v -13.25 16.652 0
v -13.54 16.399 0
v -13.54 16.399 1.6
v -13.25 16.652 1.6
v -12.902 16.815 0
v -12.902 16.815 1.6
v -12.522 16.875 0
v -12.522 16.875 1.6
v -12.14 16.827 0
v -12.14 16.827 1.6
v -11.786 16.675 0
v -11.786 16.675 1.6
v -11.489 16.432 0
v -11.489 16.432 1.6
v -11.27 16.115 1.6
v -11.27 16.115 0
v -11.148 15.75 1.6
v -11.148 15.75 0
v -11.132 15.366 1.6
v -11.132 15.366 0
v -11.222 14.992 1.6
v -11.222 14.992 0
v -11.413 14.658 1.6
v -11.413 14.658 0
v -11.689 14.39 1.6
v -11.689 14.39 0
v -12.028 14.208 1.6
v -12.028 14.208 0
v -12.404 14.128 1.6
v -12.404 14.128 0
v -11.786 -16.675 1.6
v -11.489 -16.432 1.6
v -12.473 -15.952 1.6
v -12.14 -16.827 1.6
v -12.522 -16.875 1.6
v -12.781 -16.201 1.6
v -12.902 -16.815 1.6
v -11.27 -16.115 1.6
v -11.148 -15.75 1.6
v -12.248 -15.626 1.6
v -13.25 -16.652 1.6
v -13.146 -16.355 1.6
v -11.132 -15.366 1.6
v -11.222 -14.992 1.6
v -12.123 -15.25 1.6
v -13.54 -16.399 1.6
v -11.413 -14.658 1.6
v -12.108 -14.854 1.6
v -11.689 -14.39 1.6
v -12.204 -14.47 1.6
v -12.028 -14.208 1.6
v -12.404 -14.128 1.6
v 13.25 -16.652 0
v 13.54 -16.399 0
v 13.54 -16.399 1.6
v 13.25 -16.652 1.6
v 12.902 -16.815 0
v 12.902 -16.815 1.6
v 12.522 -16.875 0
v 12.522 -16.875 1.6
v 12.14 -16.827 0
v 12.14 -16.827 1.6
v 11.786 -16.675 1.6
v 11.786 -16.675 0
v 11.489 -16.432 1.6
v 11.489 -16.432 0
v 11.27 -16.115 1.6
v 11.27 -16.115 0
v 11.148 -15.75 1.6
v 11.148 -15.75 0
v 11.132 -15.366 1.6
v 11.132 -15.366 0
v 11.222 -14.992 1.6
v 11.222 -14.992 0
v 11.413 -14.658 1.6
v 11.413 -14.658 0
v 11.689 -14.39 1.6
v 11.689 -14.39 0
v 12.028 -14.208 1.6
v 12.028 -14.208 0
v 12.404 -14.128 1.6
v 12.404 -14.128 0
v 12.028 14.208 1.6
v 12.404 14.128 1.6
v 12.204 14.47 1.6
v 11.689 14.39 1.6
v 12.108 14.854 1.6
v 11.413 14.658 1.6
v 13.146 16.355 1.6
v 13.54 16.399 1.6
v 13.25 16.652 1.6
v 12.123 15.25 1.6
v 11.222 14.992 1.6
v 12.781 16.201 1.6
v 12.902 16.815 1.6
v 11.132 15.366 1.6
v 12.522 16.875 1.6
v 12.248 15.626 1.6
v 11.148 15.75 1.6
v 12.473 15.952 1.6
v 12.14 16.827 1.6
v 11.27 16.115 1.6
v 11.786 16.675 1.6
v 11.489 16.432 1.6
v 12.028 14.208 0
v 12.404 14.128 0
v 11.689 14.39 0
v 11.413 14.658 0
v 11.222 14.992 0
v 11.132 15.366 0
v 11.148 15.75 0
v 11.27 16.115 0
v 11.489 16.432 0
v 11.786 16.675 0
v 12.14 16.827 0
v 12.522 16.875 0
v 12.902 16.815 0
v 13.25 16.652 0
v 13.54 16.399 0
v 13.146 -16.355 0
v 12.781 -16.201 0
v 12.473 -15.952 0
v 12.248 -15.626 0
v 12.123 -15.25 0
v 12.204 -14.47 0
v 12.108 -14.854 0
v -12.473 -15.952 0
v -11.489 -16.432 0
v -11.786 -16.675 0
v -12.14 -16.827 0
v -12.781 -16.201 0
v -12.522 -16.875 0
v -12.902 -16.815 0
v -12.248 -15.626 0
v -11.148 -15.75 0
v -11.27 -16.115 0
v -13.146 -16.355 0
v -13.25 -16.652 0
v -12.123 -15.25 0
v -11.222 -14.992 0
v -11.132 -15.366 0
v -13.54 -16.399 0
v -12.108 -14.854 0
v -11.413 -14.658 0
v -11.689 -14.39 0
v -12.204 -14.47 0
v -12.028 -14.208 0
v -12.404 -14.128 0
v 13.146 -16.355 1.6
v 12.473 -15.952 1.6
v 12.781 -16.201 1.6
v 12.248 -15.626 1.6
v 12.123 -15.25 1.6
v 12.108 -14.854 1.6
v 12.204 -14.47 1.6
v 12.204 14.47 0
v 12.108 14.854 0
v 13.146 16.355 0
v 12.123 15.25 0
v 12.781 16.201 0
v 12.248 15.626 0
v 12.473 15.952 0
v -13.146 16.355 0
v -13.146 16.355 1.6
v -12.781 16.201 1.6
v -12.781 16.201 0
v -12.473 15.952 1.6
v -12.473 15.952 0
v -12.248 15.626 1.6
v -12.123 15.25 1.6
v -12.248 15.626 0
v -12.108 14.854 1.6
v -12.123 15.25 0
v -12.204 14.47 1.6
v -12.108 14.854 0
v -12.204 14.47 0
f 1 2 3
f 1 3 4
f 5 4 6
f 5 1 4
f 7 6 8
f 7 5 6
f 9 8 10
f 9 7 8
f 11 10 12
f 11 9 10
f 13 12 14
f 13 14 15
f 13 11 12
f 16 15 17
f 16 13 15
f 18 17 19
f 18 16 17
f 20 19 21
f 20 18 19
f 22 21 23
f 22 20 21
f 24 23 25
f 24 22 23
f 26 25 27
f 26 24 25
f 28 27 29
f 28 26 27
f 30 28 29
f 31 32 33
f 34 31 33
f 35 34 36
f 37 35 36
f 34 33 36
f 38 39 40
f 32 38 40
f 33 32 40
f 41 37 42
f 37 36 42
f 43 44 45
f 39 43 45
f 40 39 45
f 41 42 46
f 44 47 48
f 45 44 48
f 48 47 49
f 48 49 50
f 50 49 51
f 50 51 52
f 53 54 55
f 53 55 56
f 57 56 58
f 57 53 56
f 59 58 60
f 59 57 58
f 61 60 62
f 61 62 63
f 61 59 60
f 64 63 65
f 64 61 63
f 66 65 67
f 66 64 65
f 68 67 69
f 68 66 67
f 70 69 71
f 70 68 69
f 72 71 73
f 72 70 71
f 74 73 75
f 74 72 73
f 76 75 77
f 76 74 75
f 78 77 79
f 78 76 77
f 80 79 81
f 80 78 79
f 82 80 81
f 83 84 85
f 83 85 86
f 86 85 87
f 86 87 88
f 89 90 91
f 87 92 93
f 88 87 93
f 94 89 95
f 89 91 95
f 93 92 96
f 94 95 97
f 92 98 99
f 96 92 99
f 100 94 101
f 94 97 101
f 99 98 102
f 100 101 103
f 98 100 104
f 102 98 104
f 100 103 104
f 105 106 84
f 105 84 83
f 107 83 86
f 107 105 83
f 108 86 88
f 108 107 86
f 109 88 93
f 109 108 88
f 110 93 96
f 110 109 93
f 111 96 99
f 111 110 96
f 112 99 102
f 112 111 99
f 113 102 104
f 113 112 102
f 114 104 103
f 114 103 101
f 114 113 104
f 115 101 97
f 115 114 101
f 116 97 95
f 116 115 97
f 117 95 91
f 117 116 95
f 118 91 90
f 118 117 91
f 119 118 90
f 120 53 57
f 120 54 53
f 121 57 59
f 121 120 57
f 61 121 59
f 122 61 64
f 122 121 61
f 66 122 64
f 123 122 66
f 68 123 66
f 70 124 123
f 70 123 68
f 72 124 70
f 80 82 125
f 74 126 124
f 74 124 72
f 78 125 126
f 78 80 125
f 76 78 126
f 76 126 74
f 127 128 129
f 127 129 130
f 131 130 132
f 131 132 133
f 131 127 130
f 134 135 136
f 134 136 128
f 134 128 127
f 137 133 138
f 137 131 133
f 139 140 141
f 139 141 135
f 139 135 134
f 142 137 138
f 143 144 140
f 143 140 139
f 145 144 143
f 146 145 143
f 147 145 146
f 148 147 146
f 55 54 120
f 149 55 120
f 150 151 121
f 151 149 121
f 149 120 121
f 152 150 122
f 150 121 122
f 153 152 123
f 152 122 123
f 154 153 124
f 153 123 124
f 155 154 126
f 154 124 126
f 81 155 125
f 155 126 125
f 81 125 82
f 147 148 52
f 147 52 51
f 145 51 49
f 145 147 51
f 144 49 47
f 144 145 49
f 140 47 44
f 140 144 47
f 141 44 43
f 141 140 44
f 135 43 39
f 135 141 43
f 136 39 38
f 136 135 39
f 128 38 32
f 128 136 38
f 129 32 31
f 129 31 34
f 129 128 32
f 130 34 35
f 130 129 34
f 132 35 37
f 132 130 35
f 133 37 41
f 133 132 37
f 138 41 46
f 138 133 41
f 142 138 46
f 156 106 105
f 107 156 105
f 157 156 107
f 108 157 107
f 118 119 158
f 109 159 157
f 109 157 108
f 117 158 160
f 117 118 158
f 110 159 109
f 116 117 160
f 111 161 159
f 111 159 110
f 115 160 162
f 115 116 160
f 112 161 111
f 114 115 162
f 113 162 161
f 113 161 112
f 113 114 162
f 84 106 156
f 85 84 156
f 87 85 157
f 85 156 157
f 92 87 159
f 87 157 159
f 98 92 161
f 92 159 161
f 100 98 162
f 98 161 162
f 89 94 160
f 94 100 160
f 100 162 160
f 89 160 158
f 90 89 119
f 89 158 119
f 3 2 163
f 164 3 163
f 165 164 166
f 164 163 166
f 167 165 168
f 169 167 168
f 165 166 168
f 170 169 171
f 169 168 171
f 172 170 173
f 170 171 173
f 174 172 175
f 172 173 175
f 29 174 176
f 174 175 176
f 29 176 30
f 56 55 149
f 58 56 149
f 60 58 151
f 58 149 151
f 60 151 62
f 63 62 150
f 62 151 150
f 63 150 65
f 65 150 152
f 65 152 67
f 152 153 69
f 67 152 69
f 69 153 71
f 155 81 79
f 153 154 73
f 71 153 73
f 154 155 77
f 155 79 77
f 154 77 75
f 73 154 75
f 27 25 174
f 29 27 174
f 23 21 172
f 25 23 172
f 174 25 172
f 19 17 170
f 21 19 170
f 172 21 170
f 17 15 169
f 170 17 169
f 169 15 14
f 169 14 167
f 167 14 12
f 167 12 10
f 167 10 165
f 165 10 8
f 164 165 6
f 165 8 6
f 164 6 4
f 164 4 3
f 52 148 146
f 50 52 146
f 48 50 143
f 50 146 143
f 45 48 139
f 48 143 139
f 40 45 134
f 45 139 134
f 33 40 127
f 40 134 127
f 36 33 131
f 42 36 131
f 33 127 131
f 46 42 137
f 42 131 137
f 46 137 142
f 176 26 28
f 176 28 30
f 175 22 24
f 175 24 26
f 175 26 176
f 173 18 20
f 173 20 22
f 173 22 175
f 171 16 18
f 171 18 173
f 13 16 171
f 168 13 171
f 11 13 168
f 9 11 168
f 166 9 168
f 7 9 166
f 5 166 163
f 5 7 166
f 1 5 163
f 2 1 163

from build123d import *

# Parameters (mm, degrees)
SKETCH1_R             = 1.375
BOSS_EXTRUDE2_DEPTH   = 1.6
BOSS_EXTRUDE2_2_DEPTH = 1.6
BOSS_EXTRUDE2_3_DEPTH = 1.6
BOSS_EXTRUDE2_4_DEPTH = 1.6
SKETCH2_R             = 1.4
CUT_EXTRUDE1_DEPTH    = 22.905279044


# Read off the part's stored shape, not the designer's step: Surface-Imported1
with BuildPart() as part:
    # Sketch1 → Boss-Extrude2 (new body)
    with BuildSketch(Plane(origin=(0, 0, 0), x_dir=(-1, 0, 0), z_dir=(0, 0, -1))):
        with Locations((-12.5, 15.5)):
            Circle(SKETCH1_R)
    extrude(amount=-BOSS_EXTRUDE2_DEPTH)


with BuildPart() as body_2:
    # Sketch1 → Boss-Extrude2 2 (new body)
    with BuildSketch(Plane(origin=(0, 0, 0), x_dir=(-1, 0, 0), z_dir=(0, 0, -1))):
        with Locations((-12.5, -15.5)):
            Circle(SKETCH1_R)
    extrude(amount=-BOSS_EXTRUDE2_2_DEPTH)


with BuildPart() as body_3:
    # Sketch1 → Boss-Extrude2 3 (new body)
    with BuildSketch(Plane(origin=(0, 0, 0), x_dir=(-1, 0, 0), z_dir=(0, 0, -1))):
        with Locations((12.5, -15.5)):
            Circle(SKETCH1_R)
    extrude(amount=-BOSS_EXTRUDE2_3_DEPTH)


with BuildPart() as body_4:
    # Sketch1 → Boss-Extrude2 4 (new body)
    with BuildSketch(Plane(origin=(0, 0, 0), x_dir=(-1, 0, 0), z_dir=(0, 0, -1))):
        with Locations((12.5, 15.5)):
            Circle(SKETCH1_R)
    extrude(amount=-BOSS_EXTRUDE2_4_DEPTH)


with BuildPart() as cut_extrude1_tool:
    # Sketch2 → Cut-Extrude1 (new, through all)
    with BuildSketch(Plane(origin=(0, 0, 0), x_dir=(-1, 0, 0), z_dir=(0, 0, -1))):
        with Locations((13.5, -15)):
            Circle(SKETCH2_R)
        with Locations((13.5, 15)):
            Circle(SKETCH2_R)
        with Locations((-13.5, -15)):
            Circle(SKETCH2_R)
        with Locations((-13.5, 15)):
            Circle(SKETCH2_R)
    extrude(amount=-CUT_EXTRUDE1_DEPTH)


with BuildPart() as part_1:
    add(part.part)

    # Cut-Extrude1: cut by cut_extrude1_tool
    add(cut_extrude1_tool.part, mode=Mode.SUBTRACT)


with BuildPart() as body_2_1:
    add(body_2.part)

    # Cut-Extrude1: cut by cut_extrude1_tool
    add(cut_extrude1_tool.part, mode=Mode.SUBTRACT)


with BuildPart() as body_3_1:
    add(body_3.part)

    # Cut-Extrude1: cut by cut_extrude1_tool
    add(cut_extrude1_tool.part, mode=Mode.SUBTRACT)


with BuildPart() as body_4_1:
    add(body_4.part)

    # Cut-Extrude1: cut by cut_extrude1_tool
    add(cut_extrude1_tool.part, mode=Mode.SUBTRACT)


solid = Compound([part_1.part, body_2_1.part, body_3_1.part, body_4_1.part])
